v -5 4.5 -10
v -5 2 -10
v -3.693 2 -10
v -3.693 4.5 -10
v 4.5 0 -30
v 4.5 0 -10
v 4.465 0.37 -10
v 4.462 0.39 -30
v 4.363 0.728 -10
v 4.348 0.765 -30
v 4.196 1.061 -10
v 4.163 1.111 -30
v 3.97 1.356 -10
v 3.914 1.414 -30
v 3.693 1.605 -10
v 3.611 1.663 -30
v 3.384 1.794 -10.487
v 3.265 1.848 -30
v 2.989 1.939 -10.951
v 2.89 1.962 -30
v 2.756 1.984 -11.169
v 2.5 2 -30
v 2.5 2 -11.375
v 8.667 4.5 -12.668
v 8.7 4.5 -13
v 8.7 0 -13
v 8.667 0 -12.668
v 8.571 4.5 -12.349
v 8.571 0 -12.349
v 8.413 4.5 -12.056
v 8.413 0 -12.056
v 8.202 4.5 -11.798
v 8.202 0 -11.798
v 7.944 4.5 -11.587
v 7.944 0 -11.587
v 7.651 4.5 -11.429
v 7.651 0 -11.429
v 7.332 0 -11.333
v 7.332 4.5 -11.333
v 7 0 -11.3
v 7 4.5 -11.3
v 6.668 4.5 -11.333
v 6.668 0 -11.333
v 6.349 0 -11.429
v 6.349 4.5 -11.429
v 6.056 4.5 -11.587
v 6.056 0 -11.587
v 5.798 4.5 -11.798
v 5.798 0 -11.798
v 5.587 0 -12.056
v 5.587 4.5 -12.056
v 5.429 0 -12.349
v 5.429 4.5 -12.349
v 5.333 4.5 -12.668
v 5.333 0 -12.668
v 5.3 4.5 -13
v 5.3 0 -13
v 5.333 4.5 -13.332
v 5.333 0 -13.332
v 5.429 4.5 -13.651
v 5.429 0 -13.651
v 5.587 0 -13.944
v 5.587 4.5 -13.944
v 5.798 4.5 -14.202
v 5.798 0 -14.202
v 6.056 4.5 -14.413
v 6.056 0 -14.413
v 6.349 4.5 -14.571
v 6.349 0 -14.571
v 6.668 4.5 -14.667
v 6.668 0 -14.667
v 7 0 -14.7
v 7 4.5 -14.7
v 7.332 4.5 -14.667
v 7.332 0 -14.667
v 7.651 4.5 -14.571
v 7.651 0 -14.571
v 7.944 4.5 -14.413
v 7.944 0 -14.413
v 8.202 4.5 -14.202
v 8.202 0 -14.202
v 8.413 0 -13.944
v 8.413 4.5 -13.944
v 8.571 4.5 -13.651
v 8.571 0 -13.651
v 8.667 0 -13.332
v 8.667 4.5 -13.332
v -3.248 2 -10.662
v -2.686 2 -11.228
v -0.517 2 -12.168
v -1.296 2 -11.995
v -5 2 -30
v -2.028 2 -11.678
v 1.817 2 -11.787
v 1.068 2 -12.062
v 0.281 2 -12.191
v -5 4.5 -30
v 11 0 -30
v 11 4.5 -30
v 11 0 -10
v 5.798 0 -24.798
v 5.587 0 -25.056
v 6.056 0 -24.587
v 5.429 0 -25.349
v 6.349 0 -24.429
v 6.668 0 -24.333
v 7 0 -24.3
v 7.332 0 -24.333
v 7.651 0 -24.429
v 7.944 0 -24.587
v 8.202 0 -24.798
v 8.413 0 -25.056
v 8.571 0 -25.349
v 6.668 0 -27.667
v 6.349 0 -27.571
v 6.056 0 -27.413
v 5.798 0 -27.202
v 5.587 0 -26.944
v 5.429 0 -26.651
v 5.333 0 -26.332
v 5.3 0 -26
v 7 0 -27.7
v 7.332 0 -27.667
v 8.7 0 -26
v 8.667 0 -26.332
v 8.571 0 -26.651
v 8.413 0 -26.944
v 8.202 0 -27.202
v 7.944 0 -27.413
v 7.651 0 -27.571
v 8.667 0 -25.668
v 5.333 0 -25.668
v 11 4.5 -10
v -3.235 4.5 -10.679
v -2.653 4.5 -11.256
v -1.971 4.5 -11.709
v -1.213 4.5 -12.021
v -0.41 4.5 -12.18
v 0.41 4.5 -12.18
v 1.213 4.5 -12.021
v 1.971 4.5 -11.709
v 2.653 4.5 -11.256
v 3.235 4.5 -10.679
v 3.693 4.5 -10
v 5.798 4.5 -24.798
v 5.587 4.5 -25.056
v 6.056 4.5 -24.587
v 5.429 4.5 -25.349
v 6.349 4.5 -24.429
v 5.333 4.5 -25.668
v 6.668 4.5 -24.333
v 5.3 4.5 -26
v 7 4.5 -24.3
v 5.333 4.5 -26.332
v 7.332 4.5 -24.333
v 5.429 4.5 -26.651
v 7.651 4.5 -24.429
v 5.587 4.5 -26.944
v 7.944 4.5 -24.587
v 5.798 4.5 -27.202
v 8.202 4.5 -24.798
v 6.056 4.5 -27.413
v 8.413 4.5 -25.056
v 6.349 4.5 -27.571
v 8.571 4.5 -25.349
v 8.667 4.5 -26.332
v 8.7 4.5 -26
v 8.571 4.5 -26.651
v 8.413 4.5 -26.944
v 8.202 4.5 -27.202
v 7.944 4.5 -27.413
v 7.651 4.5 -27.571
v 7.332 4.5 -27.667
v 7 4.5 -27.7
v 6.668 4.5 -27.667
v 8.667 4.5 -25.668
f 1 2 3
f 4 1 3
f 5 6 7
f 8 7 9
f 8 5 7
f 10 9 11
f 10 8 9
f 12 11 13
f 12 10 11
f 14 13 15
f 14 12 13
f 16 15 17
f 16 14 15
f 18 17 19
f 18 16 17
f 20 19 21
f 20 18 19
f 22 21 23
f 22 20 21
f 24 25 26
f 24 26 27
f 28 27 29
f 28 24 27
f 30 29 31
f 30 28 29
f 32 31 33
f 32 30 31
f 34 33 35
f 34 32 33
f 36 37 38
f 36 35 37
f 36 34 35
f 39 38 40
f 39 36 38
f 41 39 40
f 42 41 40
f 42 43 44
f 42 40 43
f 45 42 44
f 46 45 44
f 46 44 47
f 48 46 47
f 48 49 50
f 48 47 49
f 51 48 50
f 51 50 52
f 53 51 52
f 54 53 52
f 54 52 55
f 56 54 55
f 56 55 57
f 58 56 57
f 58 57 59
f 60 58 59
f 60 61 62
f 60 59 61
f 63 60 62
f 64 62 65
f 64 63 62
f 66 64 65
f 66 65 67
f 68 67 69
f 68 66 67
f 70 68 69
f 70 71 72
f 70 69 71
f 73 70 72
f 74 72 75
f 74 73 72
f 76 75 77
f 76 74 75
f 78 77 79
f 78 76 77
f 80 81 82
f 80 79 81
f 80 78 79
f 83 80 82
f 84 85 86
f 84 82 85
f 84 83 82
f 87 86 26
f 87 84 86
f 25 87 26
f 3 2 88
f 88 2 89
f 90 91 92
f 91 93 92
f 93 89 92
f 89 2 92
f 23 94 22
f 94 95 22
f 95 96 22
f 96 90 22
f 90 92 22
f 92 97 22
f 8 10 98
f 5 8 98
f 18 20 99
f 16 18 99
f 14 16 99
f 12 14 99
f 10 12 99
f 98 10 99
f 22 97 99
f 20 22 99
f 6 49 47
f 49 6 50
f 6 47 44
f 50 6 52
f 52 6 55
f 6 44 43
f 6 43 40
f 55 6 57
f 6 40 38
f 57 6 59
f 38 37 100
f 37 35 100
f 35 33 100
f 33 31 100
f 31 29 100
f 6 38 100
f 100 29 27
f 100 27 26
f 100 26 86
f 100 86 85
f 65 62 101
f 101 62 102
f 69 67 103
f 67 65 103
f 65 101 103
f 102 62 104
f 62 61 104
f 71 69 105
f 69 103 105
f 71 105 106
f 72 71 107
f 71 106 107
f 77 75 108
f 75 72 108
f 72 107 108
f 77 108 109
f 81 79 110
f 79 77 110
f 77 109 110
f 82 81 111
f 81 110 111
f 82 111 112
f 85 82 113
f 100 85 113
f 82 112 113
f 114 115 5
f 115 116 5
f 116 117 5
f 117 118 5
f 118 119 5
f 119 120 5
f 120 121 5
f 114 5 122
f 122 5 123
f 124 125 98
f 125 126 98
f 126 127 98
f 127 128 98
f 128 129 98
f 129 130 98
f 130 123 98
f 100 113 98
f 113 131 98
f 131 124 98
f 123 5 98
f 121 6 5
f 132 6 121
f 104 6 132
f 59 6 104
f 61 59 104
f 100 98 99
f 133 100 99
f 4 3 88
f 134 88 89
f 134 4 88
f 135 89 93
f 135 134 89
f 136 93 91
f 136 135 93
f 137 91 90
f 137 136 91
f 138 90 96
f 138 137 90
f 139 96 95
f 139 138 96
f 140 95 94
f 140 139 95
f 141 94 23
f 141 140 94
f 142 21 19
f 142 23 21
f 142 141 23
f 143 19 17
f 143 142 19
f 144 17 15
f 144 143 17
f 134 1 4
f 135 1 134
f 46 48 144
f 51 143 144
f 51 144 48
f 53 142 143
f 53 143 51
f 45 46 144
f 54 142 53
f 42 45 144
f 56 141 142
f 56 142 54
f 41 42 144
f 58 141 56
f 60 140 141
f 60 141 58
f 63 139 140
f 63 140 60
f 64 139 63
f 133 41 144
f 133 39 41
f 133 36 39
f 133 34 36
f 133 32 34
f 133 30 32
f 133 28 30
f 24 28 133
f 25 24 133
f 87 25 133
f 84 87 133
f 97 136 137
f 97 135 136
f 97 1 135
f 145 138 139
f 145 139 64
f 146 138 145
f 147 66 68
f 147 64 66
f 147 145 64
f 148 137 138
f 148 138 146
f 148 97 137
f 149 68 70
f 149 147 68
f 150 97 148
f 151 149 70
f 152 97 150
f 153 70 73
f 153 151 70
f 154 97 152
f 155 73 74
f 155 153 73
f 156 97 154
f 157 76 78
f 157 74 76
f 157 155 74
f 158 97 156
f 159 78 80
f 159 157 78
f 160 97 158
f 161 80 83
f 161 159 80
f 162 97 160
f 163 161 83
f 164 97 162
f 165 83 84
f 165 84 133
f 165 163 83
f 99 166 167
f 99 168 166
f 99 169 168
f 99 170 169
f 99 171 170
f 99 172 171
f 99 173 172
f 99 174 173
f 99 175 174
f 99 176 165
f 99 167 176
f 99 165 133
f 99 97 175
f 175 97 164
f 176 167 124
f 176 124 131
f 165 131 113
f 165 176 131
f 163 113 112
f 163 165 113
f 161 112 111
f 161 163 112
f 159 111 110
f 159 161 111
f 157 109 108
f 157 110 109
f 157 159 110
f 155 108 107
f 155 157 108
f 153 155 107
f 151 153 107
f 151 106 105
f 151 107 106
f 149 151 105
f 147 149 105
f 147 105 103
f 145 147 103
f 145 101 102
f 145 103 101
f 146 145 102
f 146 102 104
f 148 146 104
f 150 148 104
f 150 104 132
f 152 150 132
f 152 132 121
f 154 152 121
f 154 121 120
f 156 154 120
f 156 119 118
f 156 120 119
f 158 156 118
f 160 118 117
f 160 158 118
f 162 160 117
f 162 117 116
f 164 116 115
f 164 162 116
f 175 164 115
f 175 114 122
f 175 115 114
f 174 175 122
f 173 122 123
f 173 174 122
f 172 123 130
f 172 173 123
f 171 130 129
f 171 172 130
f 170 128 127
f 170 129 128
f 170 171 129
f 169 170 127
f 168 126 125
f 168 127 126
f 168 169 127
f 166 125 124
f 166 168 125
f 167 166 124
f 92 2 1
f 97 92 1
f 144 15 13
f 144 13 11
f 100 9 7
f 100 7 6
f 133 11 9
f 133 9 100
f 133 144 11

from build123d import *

# Parameters (mm, degrees)
CYLINDER235_R          = 4.2
CYLINDER235_DEPTH      = 18
CYLINDER235_ROLL_ANGLE = 90
CYLINDER237_R          = 1.7
CYLINDER237_DEPTH      = 20
CYLINDER237_ROLL_ANGLE = 90
CYLINDER236_R          = 1.7
CYLINDER236_DEPTH      = 20
CYLINDER236_ROLL_ANGLE = 90
BOX001027045178_W      = 10
BOX001027045178_H      = 4
BOX001027045178_DEPTH  = 60
CYLINDER234_R          = 2
CYLINDER234_DEPTH      = 74
BOX001027045177_W      = 16
BOX001027045177_H      = 4.5
BOX001027045177_DEPTH  = 20


with BuildPart() as rocker_cut004:
    # Cylinder235 → Cylinder235 (new body)
    with BuildSketch(Plane.XY):
        Circle(CYLINDER235_R)
    extrude(amount=CYLINDER235_DEPTH)


with BuildPart() as rocker_cut004_1:
    # Cylinder235 roll: moved
    add(rocker_cut004.part.rotate(Axis((0, 0, 0), (1, 0, 0)), CYLINDER235_ROLL_ANGLE))


with BuildPart() as rocker_cut004_2:
    # Cylinder235 placement: moved
    add(rocker_cut004_1.part.moved(Location((0, 9, -8))))


with BuildPart() as cylinder264:
    # Cylinder237 → Cylinder237 (new body)
    with BuildSketch(Plane.XY):
        Circle(CYLINDER237_R)
    extrude(amount=CYLINDER237_DEPTH)


with BuildPart() as cylinder264_1:
    # Cylinder237 roll: moved
    add(cylinder264.part.rotate(Axis((0, 0, 0), (1, 0, 0)), CYLINDER237_ROLL_ANGLE))


with BuildPart() as cylinder264_2:
    # Cylinder237 placement: moved
    add(cylinder264_1.part.moved(Location((7, 11, -13))))


with BuildPart() as top_slot_m3_clearance001:
    # Cylinder236 → Cylinder236 (new body)
    with BuildSketch(Plane.XY):
        Circle(CYLINDER236_R)
    extrude(amount=CYLINDER236_DEPTH)


with BuildPart() as top_slot_m3_clearance001_1:
    # Cylinder236 roll: moved
    add(top_slot_m3_clearance001.part.rotate(Axis((0, 0, 0), (1, 0, 0)), CYLINDER236_ROLL_ANGLE))


with BuildPart() as top_slot_m3_clearance001_2:
    # Cylinder236 placement: moved
    add(top_slot_m3_clearance001_1.part.moved(Location((7, 11, -26))))

    # Fusion112126: union Cylinder264
    add(cylinder264_2.part)


with BuildPart() as cube226:
    # Box001027045178 → Box001027045178 (new body)
    with BuildSketch(Plane(origin=(-10, -2, -57), x_dir=(1, 0, 0), z_dir=(0, 0, 1))):
        with Locations((5, 2)):
            Rectangle(BOX001027045178_W, BOX001027045178_H)
    extrude(amount=BOX001027045178_DEPTH)


with BuildPart() as plate_cuts:
    # Cylinder234 → Cylinder234 (new body)
    with BuildSketch(Plane.XY.offset(-62)):
        Circle(CYLINDER234_R)
    extrude(amount=CYLINDER234_DEPTH)

    # Fusion112125: union Cube226
    add(cube226.part)


with BuildPart() as plate_cuts_1:
    # Fusion112125 placement: moved
    add(plate_cuts.part.moved(Location((2.5, 0, 0))))

    # Fusion112127: union rocker-cut004, top-slot-m3-clearance001
    add(rocker_cut004_2.part)
    add(top_slot_m3_clearance001_2.part)


with BuildPart() as top_slot_plate:
    # Box001027045177 → Box001027045177 (new body)
    with BuildSketch(Plane(origin=(-5, 0, -30), x_dir=(1, 0, 0), z_dir=(0, 0, 1))):
        with Locations((8, 2.25)):
            Rectangle(BOX001027045177_W, BOX001027045177_H)
    extrude(amount=BOX001027045177_DEPTH)

    # Cut217: cut plate-cuts
    add(plate_cuts_1.part, mode=Mode.SUBTRACT)


solid = top_slot_plate.part
